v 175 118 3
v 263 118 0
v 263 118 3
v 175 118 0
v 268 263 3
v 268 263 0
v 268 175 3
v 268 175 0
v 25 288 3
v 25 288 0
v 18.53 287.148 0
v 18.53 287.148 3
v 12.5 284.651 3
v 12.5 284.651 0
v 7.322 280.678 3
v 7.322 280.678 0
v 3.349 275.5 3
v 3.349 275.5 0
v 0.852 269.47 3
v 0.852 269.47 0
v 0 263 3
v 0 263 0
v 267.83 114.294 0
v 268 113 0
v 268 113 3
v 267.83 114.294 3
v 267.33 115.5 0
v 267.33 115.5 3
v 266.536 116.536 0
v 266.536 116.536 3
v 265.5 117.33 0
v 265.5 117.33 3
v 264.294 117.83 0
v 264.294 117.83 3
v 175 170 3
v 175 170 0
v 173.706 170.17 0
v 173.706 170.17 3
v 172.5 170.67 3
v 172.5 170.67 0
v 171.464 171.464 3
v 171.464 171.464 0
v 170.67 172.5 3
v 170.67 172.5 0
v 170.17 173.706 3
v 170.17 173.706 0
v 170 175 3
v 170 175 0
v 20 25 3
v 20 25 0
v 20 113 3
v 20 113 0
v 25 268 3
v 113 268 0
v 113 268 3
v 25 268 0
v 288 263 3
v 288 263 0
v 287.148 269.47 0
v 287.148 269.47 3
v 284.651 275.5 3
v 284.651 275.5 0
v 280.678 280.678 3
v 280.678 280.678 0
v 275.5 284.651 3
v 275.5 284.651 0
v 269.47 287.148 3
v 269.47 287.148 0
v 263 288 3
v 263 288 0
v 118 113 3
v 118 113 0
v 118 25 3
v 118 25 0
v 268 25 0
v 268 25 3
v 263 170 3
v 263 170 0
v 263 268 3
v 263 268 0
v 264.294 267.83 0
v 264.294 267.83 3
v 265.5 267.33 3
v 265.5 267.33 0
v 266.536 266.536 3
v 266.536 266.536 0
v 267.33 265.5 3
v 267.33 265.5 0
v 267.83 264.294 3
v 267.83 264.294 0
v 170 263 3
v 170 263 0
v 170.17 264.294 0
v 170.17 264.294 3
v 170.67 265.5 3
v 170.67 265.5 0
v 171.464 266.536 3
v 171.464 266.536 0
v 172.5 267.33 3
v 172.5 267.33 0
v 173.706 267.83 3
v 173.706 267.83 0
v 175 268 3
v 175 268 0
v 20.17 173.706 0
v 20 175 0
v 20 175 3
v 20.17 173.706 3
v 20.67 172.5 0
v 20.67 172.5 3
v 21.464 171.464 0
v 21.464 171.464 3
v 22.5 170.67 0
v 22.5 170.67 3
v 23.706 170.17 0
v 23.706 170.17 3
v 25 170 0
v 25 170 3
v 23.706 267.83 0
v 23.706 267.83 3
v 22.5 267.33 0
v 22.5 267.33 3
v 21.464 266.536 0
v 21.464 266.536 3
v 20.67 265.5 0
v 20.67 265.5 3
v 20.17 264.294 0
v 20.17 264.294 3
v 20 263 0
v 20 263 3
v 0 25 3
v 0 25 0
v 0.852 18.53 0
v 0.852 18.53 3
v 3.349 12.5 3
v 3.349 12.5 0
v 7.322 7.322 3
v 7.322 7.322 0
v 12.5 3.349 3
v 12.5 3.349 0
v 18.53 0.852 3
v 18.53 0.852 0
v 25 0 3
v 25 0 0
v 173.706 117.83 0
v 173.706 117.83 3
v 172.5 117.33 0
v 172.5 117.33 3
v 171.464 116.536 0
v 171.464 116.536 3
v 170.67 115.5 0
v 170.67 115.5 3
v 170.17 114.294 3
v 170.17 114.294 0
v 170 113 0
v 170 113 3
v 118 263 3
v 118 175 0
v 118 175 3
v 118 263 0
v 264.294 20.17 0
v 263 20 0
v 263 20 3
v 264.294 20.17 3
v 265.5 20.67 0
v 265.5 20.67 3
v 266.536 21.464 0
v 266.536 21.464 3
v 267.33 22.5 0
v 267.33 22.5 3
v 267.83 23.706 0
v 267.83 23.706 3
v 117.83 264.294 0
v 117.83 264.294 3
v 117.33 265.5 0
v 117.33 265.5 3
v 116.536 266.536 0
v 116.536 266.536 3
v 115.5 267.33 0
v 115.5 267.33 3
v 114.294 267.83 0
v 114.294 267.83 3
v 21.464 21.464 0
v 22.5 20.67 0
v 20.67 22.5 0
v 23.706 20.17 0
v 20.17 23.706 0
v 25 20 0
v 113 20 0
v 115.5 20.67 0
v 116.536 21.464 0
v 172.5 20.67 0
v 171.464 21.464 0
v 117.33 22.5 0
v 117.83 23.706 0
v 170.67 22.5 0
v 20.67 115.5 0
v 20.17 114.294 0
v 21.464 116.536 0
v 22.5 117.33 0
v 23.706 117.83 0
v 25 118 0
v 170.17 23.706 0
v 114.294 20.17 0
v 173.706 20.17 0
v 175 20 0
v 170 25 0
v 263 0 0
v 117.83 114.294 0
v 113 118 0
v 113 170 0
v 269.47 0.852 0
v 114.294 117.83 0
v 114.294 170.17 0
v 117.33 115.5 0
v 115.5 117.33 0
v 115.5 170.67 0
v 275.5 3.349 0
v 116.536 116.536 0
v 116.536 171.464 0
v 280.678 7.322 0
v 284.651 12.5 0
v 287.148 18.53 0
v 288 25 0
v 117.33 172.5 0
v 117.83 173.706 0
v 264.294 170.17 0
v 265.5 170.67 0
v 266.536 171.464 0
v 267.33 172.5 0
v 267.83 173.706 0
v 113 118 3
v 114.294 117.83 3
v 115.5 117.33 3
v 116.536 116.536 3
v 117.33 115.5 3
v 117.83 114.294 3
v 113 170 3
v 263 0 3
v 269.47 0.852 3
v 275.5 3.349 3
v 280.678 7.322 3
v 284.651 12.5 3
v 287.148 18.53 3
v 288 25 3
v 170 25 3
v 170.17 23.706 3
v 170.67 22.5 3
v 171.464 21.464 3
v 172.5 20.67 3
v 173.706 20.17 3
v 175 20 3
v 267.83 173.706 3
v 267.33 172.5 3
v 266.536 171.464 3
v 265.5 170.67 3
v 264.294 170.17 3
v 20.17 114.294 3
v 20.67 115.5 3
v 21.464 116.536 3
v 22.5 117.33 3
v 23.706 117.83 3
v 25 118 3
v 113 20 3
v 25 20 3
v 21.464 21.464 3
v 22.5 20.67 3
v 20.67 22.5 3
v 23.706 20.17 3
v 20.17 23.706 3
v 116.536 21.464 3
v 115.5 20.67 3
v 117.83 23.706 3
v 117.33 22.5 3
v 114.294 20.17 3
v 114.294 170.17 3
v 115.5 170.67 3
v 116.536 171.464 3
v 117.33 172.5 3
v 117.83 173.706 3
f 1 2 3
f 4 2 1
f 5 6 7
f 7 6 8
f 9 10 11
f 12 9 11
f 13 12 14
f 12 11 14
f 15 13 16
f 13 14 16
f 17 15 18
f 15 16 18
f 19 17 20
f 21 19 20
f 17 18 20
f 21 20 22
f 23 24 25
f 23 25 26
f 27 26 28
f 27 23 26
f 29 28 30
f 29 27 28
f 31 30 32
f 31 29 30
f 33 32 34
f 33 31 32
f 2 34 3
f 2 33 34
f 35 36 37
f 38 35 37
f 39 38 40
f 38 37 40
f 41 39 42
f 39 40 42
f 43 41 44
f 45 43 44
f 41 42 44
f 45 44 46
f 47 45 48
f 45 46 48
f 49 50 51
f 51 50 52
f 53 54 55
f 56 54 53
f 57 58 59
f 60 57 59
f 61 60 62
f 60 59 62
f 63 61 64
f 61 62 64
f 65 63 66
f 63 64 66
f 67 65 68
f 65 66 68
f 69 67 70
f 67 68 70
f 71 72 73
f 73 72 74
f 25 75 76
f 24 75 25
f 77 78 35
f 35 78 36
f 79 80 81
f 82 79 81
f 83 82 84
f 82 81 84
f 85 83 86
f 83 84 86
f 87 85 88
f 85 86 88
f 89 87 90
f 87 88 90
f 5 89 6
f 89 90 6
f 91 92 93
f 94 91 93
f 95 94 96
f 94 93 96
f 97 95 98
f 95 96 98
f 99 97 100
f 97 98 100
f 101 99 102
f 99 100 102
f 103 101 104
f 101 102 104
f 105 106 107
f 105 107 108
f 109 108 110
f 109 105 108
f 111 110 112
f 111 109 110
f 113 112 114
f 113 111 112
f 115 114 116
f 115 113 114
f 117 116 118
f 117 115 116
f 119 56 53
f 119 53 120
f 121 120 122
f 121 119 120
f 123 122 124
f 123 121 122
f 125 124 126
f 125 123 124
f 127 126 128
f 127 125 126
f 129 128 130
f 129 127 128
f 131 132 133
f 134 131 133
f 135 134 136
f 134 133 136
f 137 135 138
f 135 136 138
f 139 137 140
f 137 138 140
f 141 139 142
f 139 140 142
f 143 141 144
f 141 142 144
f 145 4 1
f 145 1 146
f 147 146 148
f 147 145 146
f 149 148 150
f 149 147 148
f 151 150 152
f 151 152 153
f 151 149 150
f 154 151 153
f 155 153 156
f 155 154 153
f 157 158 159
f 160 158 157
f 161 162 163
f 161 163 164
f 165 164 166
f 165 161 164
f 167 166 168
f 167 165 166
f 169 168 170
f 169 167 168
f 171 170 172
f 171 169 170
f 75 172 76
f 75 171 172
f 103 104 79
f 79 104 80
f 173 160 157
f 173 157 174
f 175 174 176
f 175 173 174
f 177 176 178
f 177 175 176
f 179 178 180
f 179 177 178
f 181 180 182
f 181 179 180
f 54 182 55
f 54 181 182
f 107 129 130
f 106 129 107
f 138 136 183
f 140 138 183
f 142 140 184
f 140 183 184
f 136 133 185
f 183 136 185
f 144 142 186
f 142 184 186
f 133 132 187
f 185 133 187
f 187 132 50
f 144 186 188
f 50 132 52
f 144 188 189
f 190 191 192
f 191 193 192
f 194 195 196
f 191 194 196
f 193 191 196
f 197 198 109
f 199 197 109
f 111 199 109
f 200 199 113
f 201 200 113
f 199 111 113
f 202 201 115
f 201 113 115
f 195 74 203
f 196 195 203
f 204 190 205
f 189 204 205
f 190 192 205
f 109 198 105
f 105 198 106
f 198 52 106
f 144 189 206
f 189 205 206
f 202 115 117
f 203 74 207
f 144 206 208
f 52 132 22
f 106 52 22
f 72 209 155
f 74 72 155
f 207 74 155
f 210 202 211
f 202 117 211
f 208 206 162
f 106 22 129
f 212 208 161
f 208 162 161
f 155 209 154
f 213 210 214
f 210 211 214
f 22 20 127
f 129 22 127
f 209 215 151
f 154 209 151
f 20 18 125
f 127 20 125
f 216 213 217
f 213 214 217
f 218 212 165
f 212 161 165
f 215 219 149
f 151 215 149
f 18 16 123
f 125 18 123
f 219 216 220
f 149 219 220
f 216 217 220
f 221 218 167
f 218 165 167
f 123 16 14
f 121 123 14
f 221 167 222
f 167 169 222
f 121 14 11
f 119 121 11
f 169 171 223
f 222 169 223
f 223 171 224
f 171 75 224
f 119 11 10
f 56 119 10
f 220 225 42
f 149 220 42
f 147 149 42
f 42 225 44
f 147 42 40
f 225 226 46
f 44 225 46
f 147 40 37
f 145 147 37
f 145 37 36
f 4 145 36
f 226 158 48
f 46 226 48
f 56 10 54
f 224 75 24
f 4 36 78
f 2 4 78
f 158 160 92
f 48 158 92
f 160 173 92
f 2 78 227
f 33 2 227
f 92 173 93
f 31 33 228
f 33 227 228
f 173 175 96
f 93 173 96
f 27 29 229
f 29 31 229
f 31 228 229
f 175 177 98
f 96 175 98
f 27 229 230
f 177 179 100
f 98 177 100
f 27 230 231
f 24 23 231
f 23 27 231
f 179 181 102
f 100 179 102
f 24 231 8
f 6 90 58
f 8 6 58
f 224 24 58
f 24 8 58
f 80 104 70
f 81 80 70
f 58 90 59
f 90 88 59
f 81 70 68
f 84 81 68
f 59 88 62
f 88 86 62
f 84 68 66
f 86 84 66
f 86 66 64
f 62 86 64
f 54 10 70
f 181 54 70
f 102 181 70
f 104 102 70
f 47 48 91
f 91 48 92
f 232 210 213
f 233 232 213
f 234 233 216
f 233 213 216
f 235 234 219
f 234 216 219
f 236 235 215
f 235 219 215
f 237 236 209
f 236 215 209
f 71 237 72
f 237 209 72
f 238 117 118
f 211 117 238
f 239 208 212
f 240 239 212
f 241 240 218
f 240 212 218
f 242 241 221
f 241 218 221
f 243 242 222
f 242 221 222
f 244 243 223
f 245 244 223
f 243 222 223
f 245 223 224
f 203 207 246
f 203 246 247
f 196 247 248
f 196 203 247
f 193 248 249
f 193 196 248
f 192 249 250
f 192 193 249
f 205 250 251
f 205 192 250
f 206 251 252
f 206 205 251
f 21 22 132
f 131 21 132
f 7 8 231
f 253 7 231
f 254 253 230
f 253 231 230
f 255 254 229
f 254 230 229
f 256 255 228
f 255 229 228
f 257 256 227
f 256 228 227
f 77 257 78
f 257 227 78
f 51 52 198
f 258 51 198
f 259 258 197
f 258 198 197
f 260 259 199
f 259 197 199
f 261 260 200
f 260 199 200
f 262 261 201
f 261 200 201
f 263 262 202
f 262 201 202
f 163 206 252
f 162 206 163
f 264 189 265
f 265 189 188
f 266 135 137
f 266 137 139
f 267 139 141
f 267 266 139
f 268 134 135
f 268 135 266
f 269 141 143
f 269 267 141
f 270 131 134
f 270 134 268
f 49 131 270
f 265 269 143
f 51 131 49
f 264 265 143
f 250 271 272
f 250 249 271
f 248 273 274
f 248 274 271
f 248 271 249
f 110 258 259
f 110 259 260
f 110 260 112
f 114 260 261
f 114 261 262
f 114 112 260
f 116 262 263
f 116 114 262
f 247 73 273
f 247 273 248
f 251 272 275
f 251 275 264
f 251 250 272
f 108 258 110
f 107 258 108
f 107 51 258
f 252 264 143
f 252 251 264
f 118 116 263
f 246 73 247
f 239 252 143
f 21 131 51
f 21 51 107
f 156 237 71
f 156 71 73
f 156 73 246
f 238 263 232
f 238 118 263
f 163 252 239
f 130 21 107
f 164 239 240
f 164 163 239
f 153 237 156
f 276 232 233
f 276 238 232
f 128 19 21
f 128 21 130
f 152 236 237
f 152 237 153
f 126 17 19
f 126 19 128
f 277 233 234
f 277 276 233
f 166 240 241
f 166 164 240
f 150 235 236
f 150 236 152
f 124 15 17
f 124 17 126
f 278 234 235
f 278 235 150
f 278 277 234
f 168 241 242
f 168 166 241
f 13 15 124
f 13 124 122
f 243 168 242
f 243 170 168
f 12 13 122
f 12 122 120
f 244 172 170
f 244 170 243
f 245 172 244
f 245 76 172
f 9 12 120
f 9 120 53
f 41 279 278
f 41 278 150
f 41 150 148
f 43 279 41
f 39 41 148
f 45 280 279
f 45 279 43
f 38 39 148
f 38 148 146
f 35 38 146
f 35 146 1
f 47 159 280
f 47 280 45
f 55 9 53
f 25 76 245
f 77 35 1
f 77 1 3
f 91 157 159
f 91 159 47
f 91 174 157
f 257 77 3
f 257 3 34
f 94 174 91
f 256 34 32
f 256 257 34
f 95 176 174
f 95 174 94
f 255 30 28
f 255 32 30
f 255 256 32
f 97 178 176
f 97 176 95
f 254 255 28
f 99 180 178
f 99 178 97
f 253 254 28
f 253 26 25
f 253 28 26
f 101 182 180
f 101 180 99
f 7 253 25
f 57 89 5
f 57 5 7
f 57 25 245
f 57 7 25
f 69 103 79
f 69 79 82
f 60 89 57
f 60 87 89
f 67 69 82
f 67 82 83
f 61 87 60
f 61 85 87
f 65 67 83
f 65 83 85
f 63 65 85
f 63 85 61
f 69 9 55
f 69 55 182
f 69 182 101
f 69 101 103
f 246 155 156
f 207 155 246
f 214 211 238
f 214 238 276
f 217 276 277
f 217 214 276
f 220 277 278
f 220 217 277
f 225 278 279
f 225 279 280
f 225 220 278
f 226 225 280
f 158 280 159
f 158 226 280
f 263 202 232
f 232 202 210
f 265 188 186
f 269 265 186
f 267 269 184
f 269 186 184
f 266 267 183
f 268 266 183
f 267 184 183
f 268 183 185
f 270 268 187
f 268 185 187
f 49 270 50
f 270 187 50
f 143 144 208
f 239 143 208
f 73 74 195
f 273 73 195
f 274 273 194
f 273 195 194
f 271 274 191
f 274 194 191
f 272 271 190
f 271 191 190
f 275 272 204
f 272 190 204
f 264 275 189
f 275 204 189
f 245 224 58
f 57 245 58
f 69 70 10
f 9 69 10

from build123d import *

# Parameters (mm, degrees)
BOSS_EXTRUDE1_DEPTH = 3


with BuildPart() as part:
    # Sketch1 → Boss-Extrude1 (new body)
    with BuildSketch(Plane.XY):
        with BuildLine():
            Line((25, 0), (263, 0))
            ThreePointArc((263, 0), (280.67766953, 7.32233047), (288, 25))
            Line((288, 25), (288, 263))
            ThreePointArc((288, 263), (280.67766953, 280.67766953), (263, 288))
            Line((263, 288), (25, 288))
            ThreePointArc((25, 288), (7.32233047, 280.67766953), (0, 263))
            Line((0, 263), (0, 25))
            ThreePointArc((0, 25), (7.32233047, 7.32233047), (25, 0))
        make_face()
        with BuildLine():
            Line((25, 170), (113, 170))
            ThreePointArc((113, 170), (116.535533906, 171.464466094), (118, 175))
            Line((118, 175), (118, 263))
            ThreePointArc((118, 263), (116.535533906, 266.535533906), (113, 268))
            Line((113, 268), (25, 268))
            ThreePointArc((25, 268), (21.464466094, 266.535533906), (20, 263))
            Line((20, 263), (20, 175))
            ThreePointArc((20, 175), (21.464466094, 171.464466094), (25, 170))
        make_face(mode=Mode.SUBTRACT)
        with BuildLine():
            Line((118, 113), (118, 25))
            ThreePointArc((118, 25), (116.535533906, 21.464466094), (113, 20))
            Line((113, 20), (25, 20))
            ThreePointArc((25, 20), (21.464466094, 21.464466094), (20, 25))
            Line((20, 25), (20, 113))
            ThreePointArc((20, 113), (21.464466094, 116.535533906), (25, 118))
            Line((25, 118), (113, 118))
            ThreePointArc((113, 118), (116.535533906, 116.535533906), (118, 113))
        make_face(mode=Mode.SUBTRACT)
        with BuildLine():
            Line((263, 118), (175, 118))
            ThreePointArc((175, 118), (171.464466094, 116.535533906), (170, 113))
            Line((170, 113), (170, 25))
            ThreePointArc((170, 25), (171.464466094, 21.464466094), (175, 20))
            Line((175, 20), (263, 20))
            ThreePointArc((263, 20), (266.535533906, 21.464466094), (268, 25))
            Line((268, 25), (268, 113))
            ThreePointArc((268, 113), (266.535533906, 116.535533906), (263, 118))
        make_face(mode=Mode.SUBTRACT)
        with BuildLine():
            Line((170, 175), (170, 263))
            ThreePointArc((170, 263), (171.464466094, 266.535533906), (175, 268))
            Line((175, 268), (263, 268))
            ThreePointArc((263, 268), (266.535533906, 266.535533906), (268, 263))
            Line((268, 263), (268, 175))
            ThreePointArc((268, 175), (266.535533906, 171.464466094), (263, 170))
            Line((263, 170), (175, 170))
            ThreePointArc((175, 170), (171.464466094, 171.464466094), (170, 175))
        make_face(mode=Mode.SUBTRACT)
    extrude(amount=BOSS_EXTRUDE1_DEPTH)


solid = part.part
